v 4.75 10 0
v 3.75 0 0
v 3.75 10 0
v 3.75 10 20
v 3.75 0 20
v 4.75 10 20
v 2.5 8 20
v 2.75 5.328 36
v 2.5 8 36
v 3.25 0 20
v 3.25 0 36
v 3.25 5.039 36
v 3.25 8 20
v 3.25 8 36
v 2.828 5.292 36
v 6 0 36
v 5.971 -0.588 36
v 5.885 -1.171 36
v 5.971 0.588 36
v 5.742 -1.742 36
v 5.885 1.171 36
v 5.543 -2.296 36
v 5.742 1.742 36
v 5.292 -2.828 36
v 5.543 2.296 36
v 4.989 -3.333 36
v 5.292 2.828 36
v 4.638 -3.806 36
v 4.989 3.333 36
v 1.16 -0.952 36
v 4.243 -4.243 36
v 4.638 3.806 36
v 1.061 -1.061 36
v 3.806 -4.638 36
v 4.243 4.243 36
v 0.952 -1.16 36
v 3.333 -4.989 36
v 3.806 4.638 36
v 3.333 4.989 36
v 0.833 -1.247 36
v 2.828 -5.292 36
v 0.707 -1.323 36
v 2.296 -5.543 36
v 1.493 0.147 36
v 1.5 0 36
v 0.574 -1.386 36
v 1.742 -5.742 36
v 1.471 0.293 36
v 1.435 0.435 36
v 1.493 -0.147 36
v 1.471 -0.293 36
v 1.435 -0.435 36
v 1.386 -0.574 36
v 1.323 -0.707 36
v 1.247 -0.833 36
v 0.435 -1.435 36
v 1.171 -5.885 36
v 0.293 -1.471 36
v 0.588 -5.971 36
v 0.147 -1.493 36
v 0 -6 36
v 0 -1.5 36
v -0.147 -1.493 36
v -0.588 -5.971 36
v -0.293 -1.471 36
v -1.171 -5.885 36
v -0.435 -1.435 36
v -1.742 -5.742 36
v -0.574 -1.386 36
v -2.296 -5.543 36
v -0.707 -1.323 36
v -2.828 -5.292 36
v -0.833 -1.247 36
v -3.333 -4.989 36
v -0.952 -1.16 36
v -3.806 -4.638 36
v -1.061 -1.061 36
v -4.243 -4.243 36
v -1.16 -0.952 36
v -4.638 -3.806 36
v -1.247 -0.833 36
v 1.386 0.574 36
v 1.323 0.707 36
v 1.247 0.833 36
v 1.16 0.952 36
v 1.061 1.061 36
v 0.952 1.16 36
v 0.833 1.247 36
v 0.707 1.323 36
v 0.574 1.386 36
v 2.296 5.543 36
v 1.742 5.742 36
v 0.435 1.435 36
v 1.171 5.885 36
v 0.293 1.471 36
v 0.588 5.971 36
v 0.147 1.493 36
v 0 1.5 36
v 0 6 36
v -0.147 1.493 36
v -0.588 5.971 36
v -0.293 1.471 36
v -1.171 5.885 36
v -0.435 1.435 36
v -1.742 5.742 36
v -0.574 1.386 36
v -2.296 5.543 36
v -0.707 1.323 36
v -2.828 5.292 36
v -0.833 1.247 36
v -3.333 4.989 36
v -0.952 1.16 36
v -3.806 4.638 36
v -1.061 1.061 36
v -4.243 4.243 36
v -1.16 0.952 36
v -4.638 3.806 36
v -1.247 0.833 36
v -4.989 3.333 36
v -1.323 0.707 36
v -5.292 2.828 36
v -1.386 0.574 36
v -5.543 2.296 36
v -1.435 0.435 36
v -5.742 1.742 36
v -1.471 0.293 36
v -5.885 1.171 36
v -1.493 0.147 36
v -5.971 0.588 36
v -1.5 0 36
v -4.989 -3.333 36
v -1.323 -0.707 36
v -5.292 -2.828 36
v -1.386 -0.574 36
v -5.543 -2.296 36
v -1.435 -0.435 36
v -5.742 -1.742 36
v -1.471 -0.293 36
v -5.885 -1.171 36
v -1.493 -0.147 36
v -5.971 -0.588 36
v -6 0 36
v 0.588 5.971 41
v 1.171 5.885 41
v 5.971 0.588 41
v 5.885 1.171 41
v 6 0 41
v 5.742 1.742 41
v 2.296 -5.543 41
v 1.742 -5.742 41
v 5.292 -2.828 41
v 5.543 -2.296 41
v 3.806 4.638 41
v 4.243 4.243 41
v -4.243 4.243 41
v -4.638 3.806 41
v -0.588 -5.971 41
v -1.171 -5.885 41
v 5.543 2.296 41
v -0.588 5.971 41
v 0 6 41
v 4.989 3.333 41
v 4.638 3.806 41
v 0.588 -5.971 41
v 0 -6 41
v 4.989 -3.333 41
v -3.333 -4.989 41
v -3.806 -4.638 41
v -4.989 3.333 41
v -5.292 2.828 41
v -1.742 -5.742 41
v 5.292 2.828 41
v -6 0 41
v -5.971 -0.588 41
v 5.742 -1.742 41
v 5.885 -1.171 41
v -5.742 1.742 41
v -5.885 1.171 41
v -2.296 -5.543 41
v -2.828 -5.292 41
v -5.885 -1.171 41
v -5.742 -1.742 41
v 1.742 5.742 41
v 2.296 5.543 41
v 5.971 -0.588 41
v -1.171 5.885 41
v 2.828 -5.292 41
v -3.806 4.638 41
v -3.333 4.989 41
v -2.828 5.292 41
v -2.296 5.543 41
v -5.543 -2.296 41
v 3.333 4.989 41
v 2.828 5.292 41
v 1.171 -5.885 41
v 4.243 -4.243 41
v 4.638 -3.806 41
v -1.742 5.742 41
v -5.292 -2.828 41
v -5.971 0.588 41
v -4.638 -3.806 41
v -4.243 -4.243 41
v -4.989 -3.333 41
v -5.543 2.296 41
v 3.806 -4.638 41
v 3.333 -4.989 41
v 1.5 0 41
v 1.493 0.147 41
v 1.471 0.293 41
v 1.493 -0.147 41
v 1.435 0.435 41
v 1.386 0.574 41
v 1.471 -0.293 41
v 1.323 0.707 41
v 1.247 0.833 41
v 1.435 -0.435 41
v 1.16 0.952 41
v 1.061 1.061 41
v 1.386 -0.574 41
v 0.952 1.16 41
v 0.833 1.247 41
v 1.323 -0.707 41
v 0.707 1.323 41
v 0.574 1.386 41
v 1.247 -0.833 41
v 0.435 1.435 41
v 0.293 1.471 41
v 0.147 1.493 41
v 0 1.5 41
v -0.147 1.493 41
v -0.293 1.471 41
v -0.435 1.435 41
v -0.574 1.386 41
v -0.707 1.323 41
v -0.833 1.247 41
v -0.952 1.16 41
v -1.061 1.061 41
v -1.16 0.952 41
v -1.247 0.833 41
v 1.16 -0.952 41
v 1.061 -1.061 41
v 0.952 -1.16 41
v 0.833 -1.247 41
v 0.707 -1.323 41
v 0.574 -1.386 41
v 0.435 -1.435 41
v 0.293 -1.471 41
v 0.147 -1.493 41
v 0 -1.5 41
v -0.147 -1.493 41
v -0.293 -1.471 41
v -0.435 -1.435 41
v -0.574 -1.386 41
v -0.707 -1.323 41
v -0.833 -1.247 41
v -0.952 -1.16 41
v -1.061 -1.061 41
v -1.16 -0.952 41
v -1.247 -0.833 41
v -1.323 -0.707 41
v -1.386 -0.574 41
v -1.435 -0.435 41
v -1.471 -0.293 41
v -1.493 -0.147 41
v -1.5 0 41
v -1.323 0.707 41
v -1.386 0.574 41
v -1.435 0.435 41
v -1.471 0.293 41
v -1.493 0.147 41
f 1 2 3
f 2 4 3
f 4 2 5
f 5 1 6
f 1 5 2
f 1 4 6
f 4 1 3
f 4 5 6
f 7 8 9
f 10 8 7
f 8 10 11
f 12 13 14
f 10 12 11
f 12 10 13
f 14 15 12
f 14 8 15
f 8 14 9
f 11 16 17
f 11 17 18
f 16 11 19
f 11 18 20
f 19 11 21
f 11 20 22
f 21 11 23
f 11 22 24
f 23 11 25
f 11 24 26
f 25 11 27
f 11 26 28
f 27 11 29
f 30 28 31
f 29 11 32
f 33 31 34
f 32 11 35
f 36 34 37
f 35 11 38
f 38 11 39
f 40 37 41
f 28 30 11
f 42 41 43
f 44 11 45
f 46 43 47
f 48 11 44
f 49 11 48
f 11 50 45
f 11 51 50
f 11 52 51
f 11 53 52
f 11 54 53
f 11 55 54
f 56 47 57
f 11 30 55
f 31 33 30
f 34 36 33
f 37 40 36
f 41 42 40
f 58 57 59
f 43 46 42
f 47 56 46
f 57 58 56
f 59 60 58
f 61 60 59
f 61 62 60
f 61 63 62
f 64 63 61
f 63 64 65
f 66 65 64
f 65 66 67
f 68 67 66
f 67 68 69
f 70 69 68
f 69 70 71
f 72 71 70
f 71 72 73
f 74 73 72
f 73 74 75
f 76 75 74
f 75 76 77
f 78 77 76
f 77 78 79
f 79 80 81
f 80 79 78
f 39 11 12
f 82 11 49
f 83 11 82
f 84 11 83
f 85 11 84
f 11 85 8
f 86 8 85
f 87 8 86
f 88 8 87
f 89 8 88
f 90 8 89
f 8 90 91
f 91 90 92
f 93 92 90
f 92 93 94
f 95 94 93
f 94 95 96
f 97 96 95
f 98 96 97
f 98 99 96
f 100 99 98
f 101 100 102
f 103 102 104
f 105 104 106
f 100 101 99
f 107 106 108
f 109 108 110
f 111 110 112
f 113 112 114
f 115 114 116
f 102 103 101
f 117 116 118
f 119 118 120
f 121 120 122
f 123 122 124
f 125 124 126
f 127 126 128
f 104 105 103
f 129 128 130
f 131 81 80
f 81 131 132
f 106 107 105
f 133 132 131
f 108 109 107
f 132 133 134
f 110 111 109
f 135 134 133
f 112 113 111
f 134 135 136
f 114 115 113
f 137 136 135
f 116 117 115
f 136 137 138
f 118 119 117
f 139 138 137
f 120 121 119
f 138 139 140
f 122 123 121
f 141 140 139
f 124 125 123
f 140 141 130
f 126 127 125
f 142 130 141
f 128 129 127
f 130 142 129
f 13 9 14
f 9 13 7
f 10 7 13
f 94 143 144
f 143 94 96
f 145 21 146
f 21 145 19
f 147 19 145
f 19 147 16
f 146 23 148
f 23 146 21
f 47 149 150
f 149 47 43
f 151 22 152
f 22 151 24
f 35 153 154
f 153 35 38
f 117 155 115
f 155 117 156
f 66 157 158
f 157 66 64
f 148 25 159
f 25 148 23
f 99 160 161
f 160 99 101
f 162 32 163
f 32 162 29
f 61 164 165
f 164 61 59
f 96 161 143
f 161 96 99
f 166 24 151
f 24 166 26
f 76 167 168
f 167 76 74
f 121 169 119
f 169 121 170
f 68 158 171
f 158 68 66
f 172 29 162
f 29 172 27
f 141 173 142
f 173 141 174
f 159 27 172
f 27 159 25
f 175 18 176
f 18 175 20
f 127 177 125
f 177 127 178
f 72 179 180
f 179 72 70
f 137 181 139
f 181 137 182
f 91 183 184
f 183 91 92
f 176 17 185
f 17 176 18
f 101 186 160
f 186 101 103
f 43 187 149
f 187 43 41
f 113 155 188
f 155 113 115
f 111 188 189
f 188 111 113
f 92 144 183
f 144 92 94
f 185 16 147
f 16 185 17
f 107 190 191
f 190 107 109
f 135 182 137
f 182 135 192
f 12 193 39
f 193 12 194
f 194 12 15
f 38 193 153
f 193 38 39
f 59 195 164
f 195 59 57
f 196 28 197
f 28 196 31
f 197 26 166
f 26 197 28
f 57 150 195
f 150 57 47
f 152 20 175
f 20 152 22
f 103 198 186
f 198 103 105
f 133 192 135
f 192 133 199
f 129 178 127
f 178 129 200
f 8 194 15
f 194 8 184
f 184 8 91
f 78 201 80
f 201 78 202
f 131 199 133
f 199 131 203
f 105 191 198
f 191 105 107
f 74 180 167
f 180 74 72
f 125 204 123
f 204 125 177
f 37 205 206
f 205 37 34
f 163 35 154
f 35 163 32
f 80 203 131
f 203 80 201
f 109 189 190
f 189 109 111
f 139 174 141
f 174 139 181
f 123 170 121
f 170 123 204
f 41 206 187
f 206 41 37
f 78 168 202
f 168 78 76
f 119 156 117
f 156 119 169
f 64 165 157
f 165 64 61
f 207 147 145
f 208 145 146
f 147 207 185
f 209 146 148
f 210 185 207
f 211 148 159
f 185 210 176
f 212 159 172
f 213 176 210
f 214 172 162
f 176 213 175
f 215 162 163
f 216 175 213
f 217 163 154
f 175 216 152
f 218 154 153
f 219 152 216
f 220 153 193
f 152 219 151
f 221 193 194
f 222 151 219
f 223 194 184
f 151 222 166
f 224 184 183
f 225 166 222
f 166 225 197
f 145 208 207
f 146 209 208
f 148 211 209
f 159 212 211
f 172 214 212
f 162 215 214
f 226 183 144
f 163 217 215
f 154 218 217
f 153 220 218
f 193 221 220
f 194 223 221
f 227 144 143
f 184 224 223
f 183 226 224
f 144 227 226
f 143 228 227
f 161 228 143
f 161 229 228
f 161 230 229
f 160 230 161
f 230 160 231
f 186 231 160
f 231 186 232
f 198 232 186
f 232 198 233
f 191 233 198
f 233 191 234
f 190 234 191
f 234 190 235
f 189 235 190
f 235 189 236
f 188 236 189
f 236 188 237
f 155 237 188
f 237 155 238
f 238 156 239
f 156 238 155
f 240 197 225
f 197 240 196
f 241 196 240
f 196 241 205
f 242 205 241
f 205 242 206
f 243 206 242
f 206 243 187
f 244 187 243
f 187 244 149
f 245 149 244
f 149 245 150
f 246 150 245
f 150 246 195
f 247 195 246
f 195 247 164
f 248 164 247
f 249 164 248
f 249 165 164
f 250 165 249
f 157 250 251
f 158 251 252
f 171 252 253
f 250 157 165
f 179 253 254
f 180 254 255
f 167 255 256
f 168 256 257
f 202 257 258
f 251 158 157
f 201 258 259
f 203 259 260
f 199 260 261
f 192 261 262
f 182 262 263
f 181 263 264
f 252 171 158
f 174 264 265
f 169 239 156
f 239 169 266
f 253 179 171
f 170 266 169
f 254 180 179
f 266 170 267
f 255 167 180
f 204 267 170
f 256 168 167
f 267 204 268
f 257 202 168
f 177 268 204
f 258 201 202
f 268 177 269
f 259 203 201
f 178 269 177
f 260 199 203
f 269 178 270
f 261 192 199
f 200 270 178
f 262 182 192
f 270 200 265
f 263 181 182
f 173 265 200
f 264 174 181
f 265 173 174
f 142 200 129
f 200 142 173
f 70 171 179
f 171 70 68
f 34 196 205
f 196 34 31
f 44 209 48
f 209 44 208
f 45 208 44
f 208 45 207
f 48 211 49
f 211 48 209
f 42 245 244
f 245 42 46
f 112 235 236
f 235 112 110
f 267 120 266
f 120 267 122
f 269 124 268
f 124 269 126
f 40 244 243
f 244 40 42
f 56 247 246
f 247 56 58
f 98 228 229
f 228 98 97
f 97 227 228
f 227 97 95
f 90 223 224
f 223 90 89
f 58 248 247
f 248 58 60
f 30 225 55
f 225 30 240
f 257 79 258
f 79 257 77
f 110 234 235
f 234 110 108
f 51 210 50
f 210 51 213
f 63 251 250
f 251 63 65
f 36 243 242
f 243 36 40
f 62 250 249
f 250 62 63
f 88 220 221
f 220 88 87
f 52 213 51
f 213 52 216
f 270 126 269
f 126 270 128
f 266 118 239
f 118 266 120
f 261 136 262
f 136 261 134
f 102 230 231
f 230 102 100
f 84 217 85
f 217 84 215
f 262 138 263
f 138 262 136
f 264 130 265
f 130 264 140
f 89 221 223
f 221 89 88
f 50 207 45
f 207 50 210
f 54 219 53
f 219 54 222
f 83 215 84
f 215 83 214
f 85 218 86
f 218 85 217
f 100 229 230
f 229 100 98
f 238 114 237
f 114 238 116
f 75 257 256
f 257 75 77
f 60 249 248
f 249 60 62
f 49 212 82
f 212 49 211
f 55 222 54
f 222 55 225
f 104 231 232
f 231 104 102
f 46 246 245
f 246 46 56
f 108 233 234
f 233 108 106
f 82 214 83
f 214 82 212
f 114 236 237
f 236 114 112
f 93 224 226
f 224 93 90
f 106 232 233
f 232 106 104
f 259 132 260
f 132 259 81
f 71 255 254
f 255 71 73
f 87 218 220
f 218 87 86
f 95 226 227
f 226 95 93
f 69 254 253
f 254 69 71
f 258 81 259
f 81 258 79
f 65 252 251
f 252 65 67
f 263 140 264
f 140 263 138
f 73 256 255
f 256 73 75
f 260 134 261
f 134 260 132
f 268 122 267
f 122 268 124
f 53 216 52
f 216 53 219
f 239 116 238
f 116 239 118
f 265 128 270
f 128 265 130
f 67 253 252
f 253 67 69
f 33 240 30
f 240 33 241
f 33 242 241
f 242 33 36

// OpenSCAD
// Hose-barb reducer: 8 mm tubing -> 5 mm tubing
// Print orientation: standing upright along +Z

$fn = 64;

// ---- Dimensions (mm) ----
tube_id_8     = 8;    // 8 mm tubing inner diameter
tube_id_5     = 5;    // 5 mm tubing inner diameter
bore          = 3;    // through-bore diameter
barb_h_8      = 10;   // 8 mm barb height
barb_od_8_bot = 7.5;  // 8 mm barb outer diameter at bottom
barb_od_8_top = 9.5;  // 8 mm barb outer diameter at top
collar_d      = 12;   // collar diameter
collar_h      = 5;    // collar height (z = 20 to 25)
barb_h_5      = 8;    // 5 mm barb height
barb_od_5_bot = 6.5;  // 5 mm barb outer diameter at bottom
barb_od_5_top = 5.0;  // 5 mm barb outer diameter at top
total_h       = 41;   // top of last 5 mm barb

eps = 0.5;            // cutter overshoot

// ---- Model ----
difference() {
    union() {
        // 8 mm barbs: z = 0 to 20
        for (i = [0 : 1])
            translate([0, 0, i * barb_h_8])
                linear_extrude(height = barb_h_8)
                    polygon([
                        [barb_od_8_bot / 2, 0],
                        [barb_od_8_top / 2, barb_h_8],
                        [barb_od_8_bot / 2, barb_h_8]
                    ]);
        // collar: z = 20 to 25
        translate([0, 0, total_h - collar_h])
            cylinder(h = collar_h, d = collar_d);
        // 5 mm barbs: z = 25 to 41
        for (i = [0 : 1])
            translate([0, 0, total_h - collar_h - (i + 1) * barb_h_5])
                linear_extrude(height = barb_h_5)
                    polygon([
                        [barb_od_5_bot / 2, 0],
                        [barb_od_5_top / 2, barb_h_5],
                        [barb_od_5_bot / 2, barb_h_5]
                    ]);
    }
    // through-bore
    translate([0, 0, -eps])
        cylinder(h = total_h + 2 * eps, d = bore);
}
